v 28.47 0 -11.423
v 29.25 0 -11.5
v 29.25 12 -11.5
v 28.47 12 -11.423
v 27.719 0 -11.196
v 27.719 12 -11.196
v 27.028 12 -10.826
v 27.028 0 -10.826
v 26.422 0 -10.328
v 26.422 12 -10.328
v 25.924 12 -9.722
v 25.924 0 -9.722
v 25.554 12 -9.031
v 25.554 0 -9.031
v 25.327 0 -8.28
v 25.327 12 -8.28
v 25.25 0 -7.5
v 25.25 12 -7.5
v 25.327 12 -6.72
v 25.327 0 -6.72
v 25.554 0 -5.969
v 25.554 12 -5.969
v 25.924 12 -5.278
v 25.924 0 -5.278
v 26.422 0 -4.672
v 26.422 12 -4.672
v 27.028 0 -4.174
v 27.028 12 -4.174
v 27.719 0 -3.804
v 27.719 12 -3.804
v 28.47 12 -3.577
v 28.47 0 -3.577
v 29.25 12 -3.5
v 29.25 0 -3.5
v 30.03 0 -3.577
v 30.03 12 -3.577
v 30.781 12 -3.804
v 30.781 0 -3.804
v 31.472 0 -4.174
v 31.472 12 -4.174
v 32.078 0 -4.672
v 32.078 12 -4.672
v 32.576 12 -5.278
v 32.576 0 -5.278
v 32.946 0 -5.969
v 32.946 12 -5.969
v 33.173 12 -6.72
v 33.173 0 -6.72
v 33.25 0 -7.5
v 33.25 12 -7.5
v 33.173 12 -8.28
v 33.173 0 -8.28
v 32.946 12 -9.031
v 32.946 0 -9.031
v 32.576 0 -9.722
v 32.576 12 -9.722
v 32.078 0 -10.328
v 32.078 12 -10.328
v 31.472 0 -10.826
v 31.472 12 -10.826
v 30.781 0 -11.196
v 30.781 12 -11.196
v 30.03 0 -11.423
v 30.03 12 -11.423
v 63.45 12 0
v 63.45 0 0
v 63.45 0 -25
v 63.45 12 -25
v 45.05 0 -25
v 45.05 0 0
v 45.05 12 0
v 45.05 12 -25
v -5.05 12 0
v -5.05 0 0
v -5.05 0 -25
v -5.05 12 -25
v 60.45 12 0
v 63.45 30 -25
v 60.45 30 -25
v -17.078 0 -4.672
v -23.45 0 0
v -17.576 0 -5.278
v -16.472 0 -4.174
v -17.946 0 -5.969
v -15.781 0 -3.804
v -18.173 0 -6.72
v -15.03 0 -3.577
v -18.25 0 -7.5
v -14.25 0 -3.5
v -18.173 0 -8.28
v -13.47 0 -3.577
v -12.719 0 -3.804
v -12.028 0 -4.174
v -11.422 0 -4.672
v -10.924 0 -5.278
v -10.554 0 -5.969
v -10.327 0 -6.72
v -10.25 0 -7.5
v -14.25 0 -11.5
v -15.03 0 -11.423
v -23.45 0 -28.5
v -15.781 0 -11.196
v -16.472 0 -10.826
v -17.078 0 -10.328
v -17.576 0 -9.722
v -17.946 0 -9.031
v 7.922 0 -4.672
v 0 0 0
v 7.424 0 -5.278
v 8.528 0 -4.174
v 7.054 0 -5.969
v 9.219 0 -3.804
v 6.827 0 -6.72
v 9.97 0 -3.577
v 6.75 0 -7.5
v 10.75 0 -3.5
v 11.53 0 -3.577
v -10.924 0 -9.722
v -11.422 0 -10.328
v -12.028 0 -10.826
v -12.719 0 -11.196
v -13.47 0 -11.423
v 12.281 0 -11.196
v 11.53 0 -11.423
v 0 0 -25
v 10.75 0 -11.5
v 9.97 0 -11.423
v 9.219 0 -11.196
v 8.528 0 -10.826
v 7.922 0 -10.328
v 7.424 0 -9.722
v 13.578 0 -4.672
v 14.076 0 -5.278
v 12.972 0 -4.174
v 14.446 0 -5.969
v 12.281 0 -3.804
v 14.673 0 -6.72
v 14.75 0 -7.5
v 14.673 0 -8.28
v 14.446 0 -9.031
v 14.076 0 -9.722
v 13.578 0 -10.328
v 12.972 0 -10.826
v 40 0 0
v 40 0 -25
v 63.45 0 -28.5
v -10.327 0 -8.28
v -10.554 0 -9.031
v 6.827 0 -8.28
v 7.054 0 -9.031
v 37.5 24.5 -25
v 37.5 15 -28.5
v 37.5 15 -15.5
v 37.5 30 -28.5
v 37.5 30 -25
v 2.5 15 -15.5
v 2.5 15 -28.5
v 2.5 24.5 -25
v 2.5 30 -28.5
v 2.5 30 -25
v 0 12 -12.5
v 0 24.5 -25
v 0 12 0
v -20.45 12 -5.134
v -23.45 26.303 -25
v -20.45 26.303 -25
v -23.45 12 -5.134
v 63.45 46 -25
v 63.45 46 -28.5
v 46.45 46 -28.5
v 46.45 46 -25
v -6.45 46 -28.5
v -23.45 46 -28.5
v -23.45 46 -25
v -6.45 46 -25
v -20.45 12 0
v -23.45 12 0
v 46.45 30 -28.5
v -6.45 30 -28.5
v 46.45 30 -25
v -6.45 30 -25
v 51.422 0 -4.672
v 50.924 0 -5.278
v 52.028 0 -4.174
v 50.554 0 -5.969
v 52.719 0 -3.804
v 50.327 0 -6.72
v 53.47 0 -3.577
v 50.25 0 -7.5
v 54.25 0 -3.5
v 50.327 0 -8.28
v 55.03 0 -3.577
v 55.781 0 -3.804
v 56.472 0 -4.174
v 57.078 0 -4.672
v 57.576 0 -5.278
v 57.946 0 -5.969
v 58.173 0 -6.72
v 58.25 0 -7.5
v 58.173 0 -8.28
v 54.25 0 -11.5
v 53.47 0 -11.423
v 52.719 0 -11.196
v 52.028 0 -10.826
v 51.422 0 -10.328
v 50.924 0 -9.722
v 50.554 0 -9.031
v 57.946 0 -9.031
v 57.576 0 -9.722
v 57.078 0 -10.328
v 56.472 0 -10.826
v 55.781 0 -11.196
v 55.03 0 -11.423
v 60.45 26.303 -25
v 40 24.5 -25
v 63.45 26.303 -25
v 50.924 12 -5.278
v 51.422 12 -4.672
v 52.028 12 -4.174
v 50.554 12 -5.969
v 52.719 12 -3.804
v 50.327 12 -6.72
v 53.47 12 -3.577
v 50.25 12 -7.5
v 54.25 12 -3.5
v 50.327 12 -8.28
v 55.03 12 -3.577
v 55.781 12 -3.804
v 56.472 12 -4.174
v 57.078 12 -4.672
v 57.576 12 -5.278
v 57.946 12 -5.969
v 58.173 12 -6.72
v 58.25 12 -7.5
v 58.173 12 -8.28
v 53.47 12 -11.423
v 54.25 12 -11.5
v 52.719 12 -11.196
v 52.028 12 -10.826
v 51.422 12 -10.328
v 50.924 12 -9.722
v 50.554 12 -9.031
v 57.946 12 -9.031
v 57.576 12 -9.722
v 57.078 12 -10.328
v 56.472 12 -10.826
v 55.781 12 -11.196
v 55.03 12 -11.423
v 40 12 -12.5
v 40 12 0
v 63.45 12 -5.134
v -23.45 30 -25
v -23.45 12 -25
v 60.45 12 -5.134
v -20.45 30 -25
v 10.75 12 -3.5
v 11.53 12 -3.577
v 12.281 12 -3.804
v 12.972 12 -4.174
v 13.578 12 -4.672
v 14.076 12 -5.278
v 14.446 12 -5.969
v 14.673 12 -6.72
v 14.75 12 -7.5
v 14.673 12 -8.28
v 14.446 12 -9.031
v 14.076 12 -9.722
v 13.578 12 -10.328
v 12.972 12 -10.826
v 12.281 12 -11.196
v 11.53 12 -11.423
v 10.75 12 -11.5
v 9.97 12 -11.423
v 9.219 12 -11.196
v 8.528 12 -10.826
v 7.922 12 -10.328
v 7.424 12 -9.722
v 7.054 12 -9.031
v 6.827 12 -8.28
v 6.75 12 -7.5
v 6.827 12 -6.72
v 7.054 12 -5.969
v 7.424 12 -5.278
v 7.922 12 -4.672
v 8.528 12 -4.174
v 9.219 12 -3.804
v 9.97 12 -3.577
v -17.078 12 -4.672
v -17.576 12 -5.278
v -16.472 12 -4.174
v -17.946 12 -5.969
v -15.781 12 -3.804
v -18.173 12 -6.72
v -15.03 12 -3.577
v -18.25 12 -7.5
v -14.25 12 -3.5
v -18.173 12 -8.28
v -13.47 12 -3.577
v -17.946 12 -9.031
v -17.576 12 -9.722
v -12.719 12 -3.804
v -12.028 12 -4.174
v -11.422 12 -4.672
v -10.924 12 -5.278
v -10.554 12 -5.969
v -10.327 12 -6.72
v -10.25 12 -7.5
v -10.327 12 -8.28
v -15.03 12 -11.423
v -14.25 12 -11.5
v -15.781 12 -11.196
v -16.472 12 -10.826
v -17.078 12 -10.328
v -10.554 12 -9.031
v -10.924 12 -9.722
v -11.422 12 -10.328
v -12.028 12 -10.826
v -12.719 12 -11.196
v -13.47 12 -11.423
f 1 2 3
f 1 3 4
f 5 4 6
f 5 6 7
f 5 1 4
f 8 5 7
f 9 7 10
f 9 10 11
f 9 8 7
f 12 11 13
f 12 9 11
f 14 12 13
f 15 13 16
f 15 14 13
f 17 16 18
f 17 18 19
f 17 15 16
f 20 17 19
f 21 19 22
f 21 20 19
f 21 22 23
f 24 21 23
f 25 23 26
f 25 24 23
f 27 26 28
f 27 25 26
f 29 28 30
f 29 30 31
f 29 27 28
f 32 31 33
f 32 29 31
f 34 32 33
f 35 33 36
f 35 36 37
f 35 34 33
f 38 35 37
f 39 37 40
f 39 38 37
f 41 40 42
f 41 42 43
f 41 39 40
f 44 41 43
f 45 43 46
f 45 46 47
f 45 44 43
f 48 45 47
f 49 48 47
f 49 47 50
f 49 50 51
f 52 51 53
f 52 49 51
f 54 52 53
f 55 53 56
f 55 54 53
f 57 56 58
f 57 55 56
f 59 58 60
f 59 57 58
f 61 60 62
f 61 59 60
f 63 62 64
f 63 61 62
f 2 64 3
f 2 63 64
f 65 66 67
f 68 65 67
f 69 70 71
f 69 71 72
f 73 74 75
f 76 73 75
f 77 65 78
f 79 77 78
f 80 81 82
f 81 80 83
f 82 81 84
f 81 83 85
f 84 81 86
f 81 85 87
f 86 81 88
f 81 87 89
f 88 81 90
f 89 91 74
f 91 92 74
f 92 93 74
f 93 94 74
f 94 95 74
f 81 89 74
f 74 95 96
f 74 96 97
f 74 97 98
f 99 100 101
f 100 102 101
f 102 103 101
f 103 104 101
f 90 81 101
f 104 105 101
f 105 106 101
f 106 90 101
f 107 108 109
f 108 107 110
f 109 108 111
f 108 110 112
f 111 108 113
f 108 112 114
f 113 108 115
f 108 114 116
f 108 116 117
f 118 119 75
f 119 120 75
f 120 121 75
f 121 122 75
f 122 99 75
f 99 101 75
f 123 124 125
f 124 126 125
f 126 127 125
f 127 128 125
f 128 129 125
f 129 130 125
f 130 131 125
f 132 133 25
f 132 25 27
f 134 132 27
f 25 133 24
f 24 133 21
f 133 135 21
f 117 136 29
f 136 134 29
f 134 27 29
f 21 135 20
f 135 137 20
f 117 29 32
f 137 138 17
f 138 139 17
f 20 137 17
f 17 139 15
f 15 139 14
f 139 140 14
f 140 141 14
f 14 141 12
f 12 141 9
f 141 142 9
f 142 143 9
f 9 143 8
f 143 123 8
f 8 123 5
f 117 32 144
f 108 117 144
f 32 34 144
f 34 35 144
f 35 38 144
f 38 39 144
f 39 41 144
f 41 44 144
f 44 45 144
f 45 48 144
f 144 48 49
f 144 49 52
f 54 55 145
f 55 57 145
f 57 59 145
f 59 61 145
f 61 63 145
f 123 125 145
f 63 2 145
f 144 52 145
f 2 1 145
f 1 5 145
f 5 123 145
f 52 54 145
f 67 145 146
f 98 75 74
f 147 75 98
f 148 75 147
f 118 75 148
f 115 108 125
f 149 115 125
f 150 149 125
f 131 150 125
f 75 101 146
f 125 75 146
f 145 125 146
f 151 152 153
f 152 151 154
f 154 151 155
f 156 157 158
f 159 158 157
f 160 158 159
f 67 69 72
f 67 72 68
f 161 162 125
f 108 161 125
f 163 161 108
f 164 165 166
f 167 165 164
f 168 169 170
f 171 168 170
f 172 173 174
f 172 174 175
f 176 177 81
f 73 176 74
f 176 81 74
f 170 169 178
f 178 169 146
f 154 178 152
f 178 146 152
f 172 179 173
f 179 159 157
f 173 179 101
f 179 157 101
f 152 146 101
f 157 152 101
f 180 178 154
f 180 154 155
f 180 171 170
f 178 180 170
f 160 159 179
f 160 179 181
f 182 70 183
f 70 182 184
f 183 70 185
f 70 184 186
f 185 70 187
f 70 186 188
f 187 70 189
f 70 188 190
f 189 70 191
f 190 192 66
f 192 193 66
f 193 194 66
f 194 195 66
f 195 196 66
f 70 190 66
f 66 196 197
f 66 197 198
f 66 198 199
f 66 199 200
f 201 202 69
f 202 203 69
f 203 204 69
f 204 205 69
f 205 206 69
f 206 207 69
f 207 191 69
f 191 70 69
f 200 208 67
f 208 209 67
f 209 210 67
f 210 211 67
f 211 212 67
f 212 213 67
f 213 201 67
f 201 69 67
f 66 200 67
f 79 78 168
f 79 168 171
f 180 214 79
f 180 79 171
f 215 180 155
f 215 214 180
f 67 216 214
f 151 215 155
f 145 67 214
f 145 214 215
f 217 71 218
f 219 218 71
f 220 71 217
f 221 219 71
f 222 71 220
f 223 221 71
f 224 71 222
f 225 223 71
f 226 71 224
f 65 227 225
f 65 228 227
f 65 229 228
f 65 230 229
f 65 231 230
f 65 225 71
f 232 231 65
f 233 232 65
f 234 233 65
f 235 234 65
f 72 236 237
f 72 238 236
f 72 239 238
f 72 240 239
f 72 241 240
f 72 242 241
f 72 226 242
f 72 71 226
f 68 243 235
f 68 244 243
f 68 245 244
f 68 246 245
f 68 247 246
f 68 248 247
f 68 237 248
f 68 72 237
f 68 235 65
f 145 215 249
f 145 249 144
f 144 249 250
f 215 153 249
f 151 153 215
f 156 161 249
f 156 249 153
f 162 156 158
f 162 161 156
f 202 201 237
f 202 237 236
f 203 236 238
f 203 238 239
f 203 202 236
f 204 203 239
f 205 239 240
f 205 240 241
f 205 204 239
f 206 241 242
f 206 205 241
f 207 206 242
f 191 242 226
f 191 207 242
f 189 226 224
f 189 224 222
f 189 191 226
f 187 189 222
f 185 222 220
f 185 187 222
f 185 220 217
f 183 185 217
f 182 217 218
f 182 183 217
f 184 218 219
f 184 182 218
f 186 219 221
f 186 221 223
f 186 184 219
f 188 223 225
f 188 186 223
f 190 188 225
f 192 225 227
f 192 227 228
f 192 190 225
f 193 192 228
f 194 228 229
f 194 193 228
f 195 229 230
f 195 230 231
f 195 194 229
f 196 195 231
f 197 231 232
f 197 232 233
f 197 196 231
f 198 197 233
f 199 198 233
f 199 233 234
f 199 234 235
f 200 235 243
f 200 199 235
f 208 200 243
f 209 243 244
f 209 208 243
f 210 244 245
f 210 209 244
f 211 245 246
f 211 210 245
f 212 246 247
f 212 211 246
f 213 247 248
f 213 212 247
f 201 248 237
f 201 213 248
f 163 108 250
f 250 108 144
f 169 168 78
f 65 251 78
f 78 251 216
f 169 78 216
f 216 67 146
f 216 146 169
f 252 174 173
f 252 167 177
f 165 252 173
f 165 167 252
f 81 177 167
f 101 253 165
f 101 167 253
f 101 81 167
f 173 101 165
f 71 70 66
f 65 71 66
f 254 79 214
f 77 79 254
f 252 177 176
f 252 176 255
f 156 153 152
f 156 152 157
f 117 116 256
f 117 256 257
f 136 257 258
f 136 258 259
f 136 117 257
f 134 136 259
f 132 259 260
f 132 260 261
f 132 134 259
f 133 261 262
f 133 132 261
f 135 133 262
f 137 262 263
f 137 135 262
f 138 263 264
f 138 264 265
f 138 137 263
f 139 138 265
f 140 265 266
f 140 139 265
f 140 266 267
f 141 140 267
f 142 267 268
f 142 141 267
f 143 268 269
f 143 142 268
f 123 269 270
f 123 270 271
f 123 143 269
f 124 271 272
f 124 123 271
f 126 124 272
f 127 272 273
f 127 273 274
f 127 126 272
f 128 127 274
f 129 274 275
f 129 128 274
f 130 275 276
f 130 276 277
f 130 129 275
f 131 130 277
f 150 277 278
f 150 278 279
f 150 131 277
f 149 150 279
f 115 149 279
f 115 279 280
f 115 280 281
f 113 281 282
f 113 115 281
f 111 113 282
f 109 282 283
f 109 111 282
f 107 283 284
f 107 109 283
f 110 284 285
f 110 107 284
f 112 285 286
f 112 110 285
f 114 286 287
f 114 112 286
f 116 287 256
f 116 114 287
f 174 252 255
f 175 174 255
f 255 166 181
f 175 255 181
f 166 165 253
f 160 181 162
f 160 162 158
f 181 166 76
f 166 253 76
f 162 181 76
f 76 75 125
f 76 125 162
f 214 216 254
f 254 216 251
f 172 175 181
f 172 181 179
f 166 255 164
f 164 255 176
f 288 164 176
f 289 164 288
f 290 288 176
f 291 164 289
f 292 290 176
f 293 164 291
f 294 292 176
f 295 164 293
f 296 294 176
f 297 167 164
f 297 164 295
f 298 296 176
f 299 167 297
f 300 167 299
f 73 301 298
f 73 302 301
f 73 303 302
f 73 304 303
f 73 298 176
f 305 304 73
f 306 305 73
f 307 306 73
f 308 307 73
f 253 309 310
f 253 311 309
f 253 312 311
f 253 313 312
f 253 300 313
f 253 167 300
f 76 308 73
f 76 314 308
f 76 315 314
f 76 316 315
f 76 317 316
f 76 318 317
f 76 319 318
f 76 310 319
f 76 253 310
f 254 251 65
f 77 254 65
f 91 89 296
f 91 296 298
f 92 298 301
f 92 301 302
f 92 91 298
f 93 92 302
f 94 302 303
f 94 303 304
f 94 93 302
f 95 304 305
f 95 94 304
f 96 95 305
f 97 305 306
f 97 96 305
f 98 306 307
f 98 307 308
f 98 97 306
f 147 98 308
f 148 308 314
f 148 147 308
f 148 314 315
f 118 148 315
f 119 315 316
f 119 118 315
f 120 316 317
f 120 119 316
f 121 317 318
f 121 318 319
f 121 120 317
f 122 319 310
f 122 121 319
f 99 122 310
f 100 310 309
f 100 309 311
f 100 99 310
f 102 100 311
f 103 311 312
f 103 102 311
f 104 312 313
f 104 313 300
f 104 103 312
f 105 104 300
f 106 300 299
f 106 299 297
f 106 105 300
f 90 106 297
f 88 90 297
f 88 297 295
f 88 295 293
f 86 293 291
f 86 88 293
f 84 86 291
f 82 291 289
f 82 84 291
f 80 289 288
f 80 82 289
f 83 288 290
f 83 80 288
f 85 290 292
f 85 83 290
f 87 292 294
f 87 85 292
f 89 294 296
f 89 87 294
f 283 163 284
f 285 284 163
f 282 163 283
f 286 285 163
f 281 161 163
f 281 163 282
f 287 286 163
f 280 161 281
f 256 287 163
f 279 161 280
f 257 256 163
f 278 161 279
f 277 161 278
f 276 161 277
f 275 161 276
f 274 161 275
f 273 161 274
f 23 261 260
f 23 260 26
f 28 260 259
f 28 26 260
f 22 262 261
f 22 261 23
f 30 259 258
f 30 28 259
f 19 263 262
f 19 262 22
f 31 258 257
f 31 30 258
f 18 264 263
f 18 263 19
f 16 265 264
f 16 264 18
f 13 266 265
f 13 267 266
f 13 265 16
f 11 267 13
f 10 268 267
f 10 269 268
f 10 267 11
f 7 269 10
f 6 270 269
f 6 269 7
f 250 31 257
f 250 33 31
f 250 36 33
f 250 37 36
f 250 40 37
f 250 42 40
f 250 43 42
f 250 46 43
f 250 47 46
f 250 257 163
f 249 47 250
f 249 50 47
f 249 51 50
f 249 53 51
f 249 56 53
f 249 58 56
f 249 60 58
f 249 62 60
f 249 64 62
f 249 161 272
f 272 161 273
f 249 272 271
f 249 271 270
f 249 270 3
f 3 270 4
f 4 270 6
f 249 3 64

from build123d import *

# Parameters (mm, degrees)
SKETCH1_W             = 40
SKETCH1_H             = 25
SKETCH1_R             = 4
BOSS_EXTRUDE1_DEPTH   = 12
SKETCH1_W_2           = 18.4
BOSS_EXTRUDE1_2_DEPTH = 12
BOSS_EXTRUDE1_3_DEPTH = 12
BOSS_EXTRUDE2_START   = -43.45
SKETCH2_W             = 3.5
SKETCH2_H             = 30
BOSS_EXTRUDE2_DEPTH   = 86.9
BOSS_EXTRUDE3_DEPTH   = 3
BOSS_EXTRUDE4_DEPTH   = 40
CUT_EXTRUDE1_START    = -13
SKETCH5_W             = 35
SKETCH5_H             = 15
CUT_EXTRUDE1_DEPTH    = 13
SKETCH6_W             = 17
SKETCH6_H             = 3.5
BOSS_EXTRUDE5_DEPTH   = 16


with BuildPart() as part:
    # Sketch1 → Boss-Extrude1 (new body)
    with BuildSketch(Plane(origin=(0, 0, 0), x_dir=(1, 0, 0), z_dir=(0, 1, 0))):
        with Locations((20, 12.5)):
            Rectangle(SKETCH1_W, SKETCH1_H)
        with Locations(Location((10.75, 7.5, 0), (0, 0, 270))):
            Circle(SKETCH1_R, mode=Mode.SUBTRACT)
        with Locations(Location((29.25, 7.5, 0), (0, 0, 90))):
            Circle(SKETCH1_R, mode=Mode.SUBTRACT)
    extrude(amount=BOSS_EXTRUDE1_DEPTH)

    # Sketch2 → Boss-Extrude2 (add)
    with BuildSketch(Plane.ZY.offset(-20).offset(BOSS_EXTRUDE2_START)):
        with Locations((-26.75, 15)):
            Rectangle(SKETCH2_W, SKETCH2_H)
    extrude(amount=BOSS_EXTRUDE2_DEPTH)



with BuildPart() as body_2:
    # Sketch1 → Boss-Extrude1 2 (new body)
    with BuildSketch(Plane(origin=(0, 0, 0), x_dir=(1, 0, 0), z_dir=(0, 1, 0))):
        with Locations((-14.25, 12.5)):
            Rectangle(SKETCH1_W_2, SKETCH1_H)
        with Locations(Location((-14.25, 7.5, 0), (0, 0, 270))):
            Circle(SKETCH1_R, mode=Mode.SUBTRACT)
    extrude(amount=BOSS_EXTRUDE1_2_DEPTH)


with BuildPart() as body_3:
    # Sketch1 → Boss-Extrude1 3 (new body)
    with BuildSketch(Plane(origin=(0, 0, 0), x_dir=(1, 0, 0), z_dir=(0, 1, 0))):
        with Locations((54.25, 12.5)):
            Rectangle(SKETCH1_W_2, SKETCH1_H)
        with Locations(Location((54.25, 7.5, 0), (0, 0, 90))):
            Circle(SKETCH1_R, mode=Mode.SUBTRACT)
    extrude(amount=BOSS_EXTRUDE1_3_DEPTH)


with BuildPart() as part_1:
    add(part.part)

    add(body_2.part)  # Boss-Extrude3 merges body 2
    # Sketch3 → Boss-Extrude3 (add)
    with BuildSketch(Plane.ZY.offset(23.45)):
        Polygon((0, 12), (-25, 30), (-25, 26.303298768), (-5.134307267, 12), align=None)
    boss_extrude3 = extrude(amount=-BOSS_EXTRUDE3_DEPTH)

    # Mirror1: Boss-Extrude3 across plane
    add(boss_extrude3.mirror(Plane.ZY.offset(-20)))

    # Sketch4 → Boss-Extrude4 (add)
    with BuildSketch(Plane.ZY):
        Polygon((-12.5, 12), (-25, 24.5), (-25, 12), align=None)
    extrude(amount=-BOSS_EXTRUDE4_DEPTH)

    # Sketch5 → Cut-Extrude1 (cut)
    with BuildSketch(Plane(origin=(0, 0, -28.5), x_dir=(-1, 0, 0), z_dir=(0, 0, -1)).offset(CUT_EXTRUDE1_START)):
        with Locations((-20, 22.5)):
            Rectangle(SKETCH5_W, SKETCH5_H)
    extrude(amount=CUT_EXTRUDE1_DEPTH, mode=Mode.SUBTRACT)

    # Sketch6 → Boss-Extrude5 (add)
    with BuildSketch(Plane(origin=(0, 30, 0), x_dir=(1, 0, 0), z_dir=(0, 1, 0))):
        with Locations((-14.95, 26.75)):
            Rectangle(SKETCH6_W, SKETCH6_H)
    boss_extrude5 = extrude(amount=BOSS_EXTRUDE5_DEPTH)

    # Mirror2: Boss-Extrude5 across plane
    add(boss_extrude5.mirror(Plane.ZY.offset(-20)))


solid = Compound([body_3.part, part_1.part])
